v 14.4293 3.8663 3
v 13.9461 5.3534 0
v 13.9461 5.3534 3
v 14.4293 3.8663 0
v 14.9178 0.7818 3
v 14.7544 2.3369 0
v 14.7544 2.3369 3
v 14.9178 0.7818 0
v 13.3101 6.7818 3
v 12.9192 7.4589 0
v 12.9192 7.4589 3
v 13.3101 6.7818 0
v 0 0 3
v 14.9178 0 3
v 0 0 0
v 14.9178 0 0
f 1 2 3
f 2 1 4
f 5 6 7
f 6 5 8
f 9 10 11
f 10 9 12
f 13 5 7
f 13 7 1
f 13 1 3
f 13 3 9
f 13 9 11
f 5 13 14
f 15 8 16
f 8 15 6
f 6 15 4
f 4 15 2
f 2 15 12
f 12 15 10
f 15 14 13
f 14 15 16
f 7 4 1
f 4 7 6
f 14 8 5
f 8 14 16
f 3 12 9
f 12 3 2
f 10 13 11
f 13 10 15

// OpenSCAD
toleranta = 1;

module felie_pizza_difference( diametru, grosime, unghi_felie)

{
 difference() {   
cylinder ( h=grosime, r= diametru/2);
   translate([-diametru/2 - toleranta, -diametru/2 -toleranta, -toleranta]) 
     cube([diametru+2*toleranta, diametru/2+toleranta, grosime+2*toleranta]);
         rotate([0, 0, unghi_felie]) translate([-diametru/2-toleranta, 0, -toleranta])
     cube([diametru+2*toleranta, diametru/2+toleranta, grosime+2*toleranta]);
    }
 }
 //---------------------------------------------
  module felie_pizza_intersection2( diametru, grosime, unghi_felie)

{
    intersection(){
 intersection() {   
cylinder ( h=grosime, r= diametru/2); 
     translate([-diametru/2-toleranta, 0, -toleranta])
     cube([diametru+2*toleranta, diametru/2+toleranta, grosime+2*toleranta]);
     
    }
        rotate([0,0, -(180-unghi_felie)])
    intersection() {   
        cylinder ( h=grosime, r= diametru/2); 
    translate([-diametru/2-toleranta, 0, -toleranta])
     cube([diametru+2*toleranta, diametru/2+toleranta, grosime+2*toleranta]);
 }
    }
        } 
     
  //----------------------
  //felie_pizza_difference( diametru=30, grosime=3, unghi_felie=30);
 
 //felie_pizza_intersection( diametru=30, grosime=3, unghi_felie=30);
 
  felie_pizza_intersection2( diametru=30, grosime=3, unghi_felie=30);
